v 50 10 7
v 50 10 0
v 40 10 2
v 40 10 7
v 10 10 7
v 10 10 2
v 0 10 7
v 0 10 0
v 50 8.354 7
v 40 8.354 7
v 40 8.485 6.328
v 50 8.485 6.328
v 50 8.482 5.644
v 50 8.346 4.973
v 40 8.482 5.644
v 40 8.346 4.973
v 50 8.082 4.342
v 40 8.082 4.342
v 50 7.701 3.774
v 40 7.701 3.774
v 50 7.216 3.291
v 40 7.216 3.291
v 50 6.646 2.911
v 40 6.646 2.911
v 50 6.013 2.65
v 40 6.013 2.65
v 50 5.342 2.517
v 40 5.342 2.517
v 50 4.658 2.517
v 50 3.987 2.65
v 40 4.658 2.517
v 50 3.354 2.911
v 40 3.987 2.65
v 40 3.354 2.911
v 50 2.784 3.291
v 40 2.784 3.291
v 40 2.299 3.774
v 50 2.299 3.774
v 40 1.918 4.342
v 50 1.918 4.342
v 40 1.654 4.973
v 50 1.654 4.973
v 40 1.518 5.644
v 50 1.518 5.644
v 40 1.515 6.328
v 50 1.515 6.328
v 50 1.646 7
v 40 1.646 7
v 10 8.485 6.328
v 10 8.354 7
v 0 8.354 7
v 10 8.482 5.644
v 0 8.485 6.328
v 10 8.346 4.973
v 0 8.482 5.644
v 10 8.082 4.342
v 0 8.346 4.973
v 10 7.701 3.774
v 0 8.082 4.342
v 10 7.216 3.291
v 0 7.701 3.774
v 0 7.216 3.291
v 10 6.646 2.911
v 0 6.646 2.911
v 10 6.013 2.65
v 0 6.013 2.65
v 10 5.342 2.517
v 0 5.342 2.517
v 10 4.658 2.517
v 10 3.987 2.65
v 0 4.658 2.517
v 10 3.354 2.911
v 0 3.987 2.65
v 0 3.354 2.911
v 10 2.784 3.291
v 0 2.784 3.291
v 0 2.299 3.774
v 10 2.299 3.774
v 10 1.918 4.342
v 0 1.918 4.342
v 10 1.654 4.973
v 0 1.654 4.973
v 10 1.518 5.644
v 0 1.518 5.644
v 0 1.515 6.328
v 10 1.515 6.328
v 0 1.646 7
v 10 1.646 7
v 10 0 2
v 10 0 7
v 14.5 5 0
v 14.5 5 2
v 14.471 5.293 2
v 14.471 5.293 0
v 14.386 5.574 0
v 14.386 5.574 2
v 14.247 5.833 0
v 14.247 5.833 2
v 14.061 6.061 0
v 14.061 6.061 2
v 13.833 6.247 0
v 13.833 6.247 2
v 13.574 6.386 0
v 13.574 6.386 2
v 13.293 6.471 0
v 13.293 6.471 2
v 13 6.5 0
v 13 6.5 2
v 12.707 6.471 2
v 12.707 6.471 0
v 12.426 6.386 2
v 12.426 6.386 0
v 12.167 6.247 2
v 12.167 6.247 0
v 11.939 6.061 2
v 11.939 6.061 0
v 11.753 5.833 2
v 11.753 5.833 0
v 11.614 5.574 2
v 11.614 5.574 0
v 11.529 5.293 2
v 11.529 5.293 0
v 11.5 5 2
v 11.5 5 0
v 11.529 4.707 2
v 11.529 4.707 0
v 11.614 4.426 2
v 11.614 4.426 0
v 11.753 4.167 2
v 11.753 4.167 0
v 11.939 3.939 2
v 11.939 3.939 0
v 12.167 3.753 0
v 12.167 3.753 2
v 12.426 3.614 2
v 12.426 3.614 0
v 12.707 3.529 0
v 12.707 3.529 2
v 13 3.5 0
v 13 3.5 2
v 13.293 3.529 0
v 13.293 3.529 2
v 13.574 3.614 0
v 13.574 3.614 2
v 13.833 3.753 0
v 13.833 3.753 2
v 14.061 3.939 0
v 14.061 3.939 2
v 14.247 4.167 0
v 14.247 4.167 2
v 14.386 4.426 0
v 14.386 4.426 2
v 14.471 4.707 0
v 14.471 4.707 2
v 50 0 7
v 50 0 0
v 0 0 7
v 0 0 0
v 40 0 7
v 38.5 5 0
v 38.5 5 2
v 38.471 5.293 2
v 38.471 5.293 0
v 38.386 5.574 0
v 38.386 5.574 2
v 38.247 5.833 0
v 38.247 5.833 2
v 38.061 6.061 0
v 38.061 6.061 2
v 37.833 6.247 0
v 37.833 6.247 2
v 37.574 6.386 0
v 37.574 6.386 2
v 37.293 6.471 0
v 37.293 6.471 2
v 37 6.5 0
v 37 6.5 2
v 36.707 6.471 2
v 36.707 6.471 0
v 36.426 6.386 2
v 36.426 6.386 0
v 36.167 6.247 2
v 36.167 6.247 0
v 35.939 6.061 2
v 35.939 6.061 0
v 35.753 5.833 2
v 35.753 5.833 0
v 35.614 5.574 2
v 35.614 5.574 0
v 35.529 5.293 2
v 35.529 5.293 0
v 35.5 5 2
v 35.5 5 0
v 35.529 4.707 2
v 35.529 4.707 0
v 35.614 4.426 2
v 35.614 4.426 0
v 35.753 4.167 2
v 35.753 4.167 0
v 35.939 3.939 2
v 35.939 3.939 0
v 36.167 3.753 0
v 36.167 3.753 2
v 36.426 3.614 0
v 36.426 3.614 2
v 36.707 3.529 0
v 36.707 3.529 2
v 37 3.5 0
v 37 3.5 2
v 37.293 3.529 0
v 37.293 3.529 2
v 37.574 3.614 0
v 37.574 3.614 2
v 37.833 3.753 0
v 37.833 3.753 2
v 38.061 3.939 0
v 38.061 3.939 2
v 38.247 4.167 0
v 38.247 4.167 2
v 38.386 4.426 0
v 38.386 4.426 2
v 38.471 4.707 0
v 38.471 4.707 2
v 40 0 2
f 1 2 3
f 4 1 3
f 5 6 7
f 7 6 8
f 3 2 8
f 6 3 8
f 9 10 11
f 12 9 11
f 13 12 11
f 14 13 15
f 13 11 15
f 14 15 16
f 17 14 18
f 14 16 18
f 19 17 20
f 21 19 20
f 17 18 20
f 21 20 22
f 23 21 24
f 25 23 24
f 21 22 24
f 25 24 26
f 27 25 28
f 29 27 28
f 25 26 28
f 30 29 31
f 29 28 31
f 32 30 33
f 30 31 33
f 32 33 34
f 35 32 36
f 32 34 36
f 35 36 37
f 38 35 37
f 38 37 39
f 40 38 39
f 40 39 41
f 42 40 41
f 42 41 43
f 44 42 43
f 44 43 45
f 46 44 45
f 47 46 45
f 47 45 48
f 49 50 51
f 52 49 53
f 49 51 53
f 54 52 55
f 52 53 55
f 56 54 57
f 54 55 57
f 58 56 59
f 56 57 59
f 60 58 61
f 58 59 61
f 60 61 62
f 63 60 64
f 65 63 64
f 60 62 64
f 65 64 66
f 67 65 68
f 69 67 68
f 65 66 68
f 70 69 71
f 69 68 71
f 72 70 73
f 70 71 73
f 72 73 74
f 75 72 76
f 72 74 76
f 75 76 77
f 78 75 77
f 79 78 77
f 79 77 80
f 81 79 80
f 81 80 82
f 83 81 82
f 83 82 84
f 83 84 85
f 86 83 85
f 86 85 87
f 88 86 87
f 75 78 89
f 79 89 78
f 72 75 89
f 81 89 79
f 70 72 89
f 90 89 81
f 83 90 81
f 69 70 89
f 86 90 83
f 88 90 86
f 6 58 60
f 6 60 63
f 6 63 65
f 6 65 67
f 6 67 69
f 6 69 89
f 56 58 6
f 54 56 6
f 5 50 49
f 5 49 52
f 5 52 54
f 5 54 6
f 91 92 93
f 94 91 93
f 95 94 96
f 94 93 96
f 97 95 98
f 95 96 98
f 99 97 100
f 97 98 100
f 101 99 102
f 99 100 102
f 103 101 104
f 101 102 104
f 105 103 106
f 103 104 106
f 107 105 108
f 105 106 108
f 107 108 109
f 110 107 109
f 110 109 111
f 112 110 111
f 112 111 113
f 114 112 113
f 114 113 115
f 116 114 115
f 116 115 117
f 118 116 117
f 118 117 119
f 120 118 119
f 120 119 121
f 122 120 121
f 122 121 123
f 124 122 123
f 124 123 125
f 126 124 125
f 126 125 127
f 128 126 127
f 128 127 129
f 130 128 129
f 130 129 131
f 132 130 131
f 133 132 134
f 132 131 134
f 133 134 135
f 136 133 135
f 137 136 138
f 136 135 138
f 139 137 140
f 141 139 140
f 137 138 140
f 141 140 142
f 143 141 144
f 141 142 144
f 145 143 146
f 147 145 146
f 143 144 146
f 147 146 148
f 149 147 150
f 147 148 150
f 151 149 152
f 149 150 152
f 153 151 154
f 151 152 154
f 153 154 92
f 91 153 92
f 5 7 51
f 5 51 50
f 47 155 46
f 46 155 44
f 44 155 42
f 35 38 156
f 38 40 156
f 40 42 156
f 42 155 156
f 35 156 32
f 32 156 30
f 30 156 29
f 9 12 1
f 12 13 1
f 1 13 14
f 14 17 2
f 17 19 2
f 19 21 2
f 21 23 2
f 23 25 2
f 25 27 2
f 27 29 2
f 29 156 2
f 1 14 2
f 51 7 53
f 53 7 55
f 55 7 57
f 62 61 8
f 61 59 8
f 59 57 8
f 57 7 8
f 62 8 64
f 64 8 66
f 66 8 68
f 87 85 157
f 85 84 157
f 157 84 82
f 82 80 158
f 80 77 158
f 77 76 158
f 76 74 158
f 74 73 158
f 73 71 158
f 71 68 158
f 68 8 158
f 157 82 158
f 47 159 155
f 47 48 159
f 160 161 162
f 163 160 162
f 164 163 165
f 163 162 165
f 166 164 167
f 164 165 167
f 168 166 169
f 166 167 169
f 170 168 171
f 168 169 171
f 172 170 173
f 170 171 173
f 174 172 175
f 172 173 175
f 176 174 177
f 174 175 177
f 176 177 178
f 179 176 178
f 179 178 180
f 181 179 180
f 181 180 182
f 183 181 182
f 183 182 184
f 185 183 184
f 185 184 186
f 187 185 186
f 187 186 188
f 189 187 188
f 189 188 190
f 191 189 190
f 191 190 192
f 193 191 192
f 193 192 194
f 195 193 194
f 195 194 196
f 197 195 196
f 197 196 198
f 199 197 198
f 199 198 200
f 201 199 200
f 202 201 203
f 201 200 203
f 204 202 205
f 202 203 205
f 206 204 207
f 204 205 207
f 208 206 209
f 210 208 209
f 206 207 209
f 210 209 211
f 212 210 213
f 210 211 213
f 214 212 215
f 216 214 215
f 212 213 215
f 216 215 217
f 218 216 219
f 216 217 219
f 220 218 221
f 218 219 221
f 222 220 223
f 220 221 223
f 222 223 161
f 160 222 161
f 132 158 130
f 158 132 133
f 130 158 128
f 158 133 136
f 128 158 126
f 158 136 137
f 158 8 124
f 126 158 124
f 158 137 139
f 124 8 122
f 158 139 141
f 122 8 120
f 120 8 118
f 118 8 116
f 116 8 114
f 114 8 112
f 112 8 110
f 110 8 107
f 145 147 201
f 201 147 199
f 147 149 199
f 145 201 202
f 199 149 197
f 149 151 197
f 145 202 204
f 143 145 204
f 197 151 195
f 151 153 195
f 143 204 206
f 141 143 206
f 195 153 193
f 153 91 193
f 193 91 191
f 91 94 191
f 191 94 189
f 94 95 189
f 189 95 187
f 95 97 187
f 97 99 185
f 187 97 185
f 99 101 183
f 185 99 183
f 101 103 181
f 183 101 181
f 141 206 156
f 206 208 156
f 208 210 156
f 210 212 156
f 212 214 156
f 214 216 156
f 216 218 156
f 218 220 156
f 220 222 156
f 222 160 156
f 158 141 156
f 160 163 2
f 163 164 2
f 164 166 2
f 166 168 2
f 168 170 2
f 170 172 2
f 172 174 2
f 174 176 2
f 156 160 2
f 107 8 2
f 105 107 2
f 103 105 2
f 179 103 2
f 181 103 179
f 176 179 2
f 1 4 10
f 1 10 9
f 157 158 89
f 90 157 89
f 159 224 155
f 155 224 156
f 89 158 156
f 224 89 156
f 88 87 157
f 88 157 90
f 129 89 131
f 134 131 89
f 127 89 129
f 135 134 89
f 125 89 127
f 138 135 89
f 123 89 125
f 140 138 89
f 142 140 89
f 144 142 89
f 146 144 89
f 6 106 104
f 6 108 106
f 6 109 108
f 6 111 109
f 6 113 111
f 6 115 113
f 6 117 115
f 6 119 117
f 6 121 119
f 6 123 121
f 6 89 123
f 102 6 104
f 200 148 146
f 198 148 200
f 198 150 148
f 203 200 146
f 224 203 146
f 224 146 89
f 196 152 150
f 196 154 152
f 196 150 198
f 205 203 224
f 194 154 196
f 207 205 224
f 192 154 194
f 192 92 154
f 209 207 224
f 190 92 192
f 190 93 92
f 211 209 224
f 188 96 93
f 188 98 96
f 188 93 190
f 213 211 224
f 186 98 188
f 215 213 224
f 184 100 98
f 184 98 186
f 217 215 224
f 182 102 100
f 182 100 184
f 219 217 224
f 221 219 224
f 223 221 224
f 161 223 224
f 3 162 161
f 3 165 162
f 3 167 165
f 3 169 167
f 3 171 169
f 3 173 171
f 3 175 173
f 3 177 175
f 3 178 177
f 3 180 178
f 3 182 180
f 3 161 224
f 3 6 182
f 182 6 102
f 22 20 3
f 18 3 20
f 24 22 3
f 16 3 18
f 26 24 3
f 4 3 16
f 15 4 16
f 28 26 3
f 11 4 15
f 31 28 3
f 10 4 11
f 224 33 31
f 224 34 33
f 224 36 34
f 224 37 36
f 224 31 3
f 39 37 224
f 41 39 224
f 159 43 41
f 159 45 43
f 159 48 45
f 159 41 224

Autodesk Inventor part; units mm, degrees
ref_plane "YZ Plane" through (0, 0, 0) normal (1, 0, 0) x (0, 1, 0)
ref_plane "XZ Plane" through (0, 0, 0) normal (0, 1, 0) x (-1, 0, 0)
ref_plane "XY Plane" through (0, 0, 0) normal (0, 0, 1) x (1, 0, 0)
sketch "Sketch1" plane through (0, 0, 0) normal (0, 0, 1) x (1, 0, 0)
  line L0 (0, 0) -> (50, 0)
  line L1 (50, 0) -> (50, 10)
  line L2 (50, 10) -> (0, 10)
  line L3 (0, 10) -> (0, 0)
  dimension "d0" = 50
  dimension "d1" = 10
extrude "Extrusion1" add sketch "Sketch1" along normal blind 7
sketch "Sketch2" plane through (0, 0, 0) normal (-1, 0, 0) x (0, 0, 1)
  circle A0 centre (6, 5) radius 3.5
  line L0 (7, 10) -> (7, 0) projected
  point P0 (0, 0)
  point P1 (7, 5)
  dimension "d4" = 7
  dimension "d33" = 1
extrude "Extrusion2" cut sketch "Sketch2" against normal through all
sketch "Sketch3" plane through (0, 0, 0) normal (0, 0, -1) x (-1, 0, 0)
  line L0 (-50, 0) -> (-50, 10) projected
  line L1 (0, 10) -> (0, 0) projected
  line L2 (-50, 10) -> (-38, 10)
  line L3 (-38, 10) -> (-38, 16)
  line L4 (-38, 16) -> (-50, 16)
  line L5 (-50, 16) -> (-50, 10)
  line L6 (0, 10) -> (-12, 10)
  line L7 (-12, 10) -> (-12, 16)
  line L8 (-12, 16) -> (0, 16)
  line L9 (0, 16) -> (0, 10)
  line L10 (0, 0) -> (-12, 0)
  line L11 (-12, 0) -> (-12, -6)
  line L12 (-12, -6) -> (0, -6)
  line L13 (0, -6) -> (0, 0)
  line L14 (-50, 0) -> (-38, 0)
  line L15 (-38, 0) -> (-38, -6)
  line L16 (-38, -6) -> (-50, -6)
  line L17 (-50, -6) -> (-50, 0)
  circle A0 centre (-44, 13) radius 1.5
  circle A1 centre (-6, 13) radius 1.5
  circle A2 centre (-6, -3) radius 1.5
  circle A3 centre (-44, -3) radius 1.5
  point P0 (-38, 13)
  point P1 (-12, 13)
  point P2 (-12, -3)
  point P3 (-50, -3)
  point P4 (-44, 16)
  point P5 (-6, 16)
  point P6 (-6, 0)
  point P7 (-44, 0)
  dimension "d15" = 12
  dimension "d16" = 6
  dimension "d17" = 12
  dimension "d18" = 6
  dimension "d19" = 12
  dimension "d20" = 6
  dimension "d21" = 12
  dimension "d22" = 6
  dimension "d23" = 3
  dimension "d24" = 3
  dimension "d25" = 3
  dimension "d26" = 3
extrude "Extrusion3" [suppressed]
sketch "Sketch4" plane through (0, 0, 7) normal (0, 0, 1) x (1, 0, 0)
  line L0 (50, 10) -> (0, 10) projected
  line L1 (0, 0) -> (50, 0) projected
  line L2 (10, 10) -> (40, 10)
  line L3 (40, 10) -> (40, 0)
  line L4 (40, 0) -> (10, 0)
  line L5 (10, 0) -> (10, 10)
  point P0 (25, 10)
  dimension "d29" = 30
extrude "Extrusion4" cut sketch "Sketch4" against normal blind 5
sketch "Sketch6" plane through (0, 0, 2) normal (0, 0, 1) x (1, 0, 0)
  line L0 (10, 10) -> (40, 10) projected
  line L1 (10, 10) -> (40, 10)
  line L2 (40, 10) -> (40, 13)
  line L3 (40, 13) -> (10, 13)
  line L4 (10, 13) -> (10, 10)
  point P0 (0, 0)
  dimension "d41" = 3
extrude "Extrusion6" [suppressed]
sketch "Sketch5" plane through (0, 0, 2) normal (0, 0, 1) x (1, 0, 0)
  circle A0 centre (13, 5) radius 1.5
  circle A1 centre (37, 5) radius 1.5
  line L0 (40, 13) -> (10, 13)
  point P0 (0, 0)
  dimension "d34" = 3
  dimension "d35" = 3
  dimension "d44" = 8
  dimension "d45" = 3
  dimension "d46" = 3
extrude "Extrusion5" cut sketch "Sketch5" against normal blind 10
equation "\"d15\" = d21"
equation "\"d17\" = d21"
equation "\"d19\" = d21"
properties part number "bearing bed2"
